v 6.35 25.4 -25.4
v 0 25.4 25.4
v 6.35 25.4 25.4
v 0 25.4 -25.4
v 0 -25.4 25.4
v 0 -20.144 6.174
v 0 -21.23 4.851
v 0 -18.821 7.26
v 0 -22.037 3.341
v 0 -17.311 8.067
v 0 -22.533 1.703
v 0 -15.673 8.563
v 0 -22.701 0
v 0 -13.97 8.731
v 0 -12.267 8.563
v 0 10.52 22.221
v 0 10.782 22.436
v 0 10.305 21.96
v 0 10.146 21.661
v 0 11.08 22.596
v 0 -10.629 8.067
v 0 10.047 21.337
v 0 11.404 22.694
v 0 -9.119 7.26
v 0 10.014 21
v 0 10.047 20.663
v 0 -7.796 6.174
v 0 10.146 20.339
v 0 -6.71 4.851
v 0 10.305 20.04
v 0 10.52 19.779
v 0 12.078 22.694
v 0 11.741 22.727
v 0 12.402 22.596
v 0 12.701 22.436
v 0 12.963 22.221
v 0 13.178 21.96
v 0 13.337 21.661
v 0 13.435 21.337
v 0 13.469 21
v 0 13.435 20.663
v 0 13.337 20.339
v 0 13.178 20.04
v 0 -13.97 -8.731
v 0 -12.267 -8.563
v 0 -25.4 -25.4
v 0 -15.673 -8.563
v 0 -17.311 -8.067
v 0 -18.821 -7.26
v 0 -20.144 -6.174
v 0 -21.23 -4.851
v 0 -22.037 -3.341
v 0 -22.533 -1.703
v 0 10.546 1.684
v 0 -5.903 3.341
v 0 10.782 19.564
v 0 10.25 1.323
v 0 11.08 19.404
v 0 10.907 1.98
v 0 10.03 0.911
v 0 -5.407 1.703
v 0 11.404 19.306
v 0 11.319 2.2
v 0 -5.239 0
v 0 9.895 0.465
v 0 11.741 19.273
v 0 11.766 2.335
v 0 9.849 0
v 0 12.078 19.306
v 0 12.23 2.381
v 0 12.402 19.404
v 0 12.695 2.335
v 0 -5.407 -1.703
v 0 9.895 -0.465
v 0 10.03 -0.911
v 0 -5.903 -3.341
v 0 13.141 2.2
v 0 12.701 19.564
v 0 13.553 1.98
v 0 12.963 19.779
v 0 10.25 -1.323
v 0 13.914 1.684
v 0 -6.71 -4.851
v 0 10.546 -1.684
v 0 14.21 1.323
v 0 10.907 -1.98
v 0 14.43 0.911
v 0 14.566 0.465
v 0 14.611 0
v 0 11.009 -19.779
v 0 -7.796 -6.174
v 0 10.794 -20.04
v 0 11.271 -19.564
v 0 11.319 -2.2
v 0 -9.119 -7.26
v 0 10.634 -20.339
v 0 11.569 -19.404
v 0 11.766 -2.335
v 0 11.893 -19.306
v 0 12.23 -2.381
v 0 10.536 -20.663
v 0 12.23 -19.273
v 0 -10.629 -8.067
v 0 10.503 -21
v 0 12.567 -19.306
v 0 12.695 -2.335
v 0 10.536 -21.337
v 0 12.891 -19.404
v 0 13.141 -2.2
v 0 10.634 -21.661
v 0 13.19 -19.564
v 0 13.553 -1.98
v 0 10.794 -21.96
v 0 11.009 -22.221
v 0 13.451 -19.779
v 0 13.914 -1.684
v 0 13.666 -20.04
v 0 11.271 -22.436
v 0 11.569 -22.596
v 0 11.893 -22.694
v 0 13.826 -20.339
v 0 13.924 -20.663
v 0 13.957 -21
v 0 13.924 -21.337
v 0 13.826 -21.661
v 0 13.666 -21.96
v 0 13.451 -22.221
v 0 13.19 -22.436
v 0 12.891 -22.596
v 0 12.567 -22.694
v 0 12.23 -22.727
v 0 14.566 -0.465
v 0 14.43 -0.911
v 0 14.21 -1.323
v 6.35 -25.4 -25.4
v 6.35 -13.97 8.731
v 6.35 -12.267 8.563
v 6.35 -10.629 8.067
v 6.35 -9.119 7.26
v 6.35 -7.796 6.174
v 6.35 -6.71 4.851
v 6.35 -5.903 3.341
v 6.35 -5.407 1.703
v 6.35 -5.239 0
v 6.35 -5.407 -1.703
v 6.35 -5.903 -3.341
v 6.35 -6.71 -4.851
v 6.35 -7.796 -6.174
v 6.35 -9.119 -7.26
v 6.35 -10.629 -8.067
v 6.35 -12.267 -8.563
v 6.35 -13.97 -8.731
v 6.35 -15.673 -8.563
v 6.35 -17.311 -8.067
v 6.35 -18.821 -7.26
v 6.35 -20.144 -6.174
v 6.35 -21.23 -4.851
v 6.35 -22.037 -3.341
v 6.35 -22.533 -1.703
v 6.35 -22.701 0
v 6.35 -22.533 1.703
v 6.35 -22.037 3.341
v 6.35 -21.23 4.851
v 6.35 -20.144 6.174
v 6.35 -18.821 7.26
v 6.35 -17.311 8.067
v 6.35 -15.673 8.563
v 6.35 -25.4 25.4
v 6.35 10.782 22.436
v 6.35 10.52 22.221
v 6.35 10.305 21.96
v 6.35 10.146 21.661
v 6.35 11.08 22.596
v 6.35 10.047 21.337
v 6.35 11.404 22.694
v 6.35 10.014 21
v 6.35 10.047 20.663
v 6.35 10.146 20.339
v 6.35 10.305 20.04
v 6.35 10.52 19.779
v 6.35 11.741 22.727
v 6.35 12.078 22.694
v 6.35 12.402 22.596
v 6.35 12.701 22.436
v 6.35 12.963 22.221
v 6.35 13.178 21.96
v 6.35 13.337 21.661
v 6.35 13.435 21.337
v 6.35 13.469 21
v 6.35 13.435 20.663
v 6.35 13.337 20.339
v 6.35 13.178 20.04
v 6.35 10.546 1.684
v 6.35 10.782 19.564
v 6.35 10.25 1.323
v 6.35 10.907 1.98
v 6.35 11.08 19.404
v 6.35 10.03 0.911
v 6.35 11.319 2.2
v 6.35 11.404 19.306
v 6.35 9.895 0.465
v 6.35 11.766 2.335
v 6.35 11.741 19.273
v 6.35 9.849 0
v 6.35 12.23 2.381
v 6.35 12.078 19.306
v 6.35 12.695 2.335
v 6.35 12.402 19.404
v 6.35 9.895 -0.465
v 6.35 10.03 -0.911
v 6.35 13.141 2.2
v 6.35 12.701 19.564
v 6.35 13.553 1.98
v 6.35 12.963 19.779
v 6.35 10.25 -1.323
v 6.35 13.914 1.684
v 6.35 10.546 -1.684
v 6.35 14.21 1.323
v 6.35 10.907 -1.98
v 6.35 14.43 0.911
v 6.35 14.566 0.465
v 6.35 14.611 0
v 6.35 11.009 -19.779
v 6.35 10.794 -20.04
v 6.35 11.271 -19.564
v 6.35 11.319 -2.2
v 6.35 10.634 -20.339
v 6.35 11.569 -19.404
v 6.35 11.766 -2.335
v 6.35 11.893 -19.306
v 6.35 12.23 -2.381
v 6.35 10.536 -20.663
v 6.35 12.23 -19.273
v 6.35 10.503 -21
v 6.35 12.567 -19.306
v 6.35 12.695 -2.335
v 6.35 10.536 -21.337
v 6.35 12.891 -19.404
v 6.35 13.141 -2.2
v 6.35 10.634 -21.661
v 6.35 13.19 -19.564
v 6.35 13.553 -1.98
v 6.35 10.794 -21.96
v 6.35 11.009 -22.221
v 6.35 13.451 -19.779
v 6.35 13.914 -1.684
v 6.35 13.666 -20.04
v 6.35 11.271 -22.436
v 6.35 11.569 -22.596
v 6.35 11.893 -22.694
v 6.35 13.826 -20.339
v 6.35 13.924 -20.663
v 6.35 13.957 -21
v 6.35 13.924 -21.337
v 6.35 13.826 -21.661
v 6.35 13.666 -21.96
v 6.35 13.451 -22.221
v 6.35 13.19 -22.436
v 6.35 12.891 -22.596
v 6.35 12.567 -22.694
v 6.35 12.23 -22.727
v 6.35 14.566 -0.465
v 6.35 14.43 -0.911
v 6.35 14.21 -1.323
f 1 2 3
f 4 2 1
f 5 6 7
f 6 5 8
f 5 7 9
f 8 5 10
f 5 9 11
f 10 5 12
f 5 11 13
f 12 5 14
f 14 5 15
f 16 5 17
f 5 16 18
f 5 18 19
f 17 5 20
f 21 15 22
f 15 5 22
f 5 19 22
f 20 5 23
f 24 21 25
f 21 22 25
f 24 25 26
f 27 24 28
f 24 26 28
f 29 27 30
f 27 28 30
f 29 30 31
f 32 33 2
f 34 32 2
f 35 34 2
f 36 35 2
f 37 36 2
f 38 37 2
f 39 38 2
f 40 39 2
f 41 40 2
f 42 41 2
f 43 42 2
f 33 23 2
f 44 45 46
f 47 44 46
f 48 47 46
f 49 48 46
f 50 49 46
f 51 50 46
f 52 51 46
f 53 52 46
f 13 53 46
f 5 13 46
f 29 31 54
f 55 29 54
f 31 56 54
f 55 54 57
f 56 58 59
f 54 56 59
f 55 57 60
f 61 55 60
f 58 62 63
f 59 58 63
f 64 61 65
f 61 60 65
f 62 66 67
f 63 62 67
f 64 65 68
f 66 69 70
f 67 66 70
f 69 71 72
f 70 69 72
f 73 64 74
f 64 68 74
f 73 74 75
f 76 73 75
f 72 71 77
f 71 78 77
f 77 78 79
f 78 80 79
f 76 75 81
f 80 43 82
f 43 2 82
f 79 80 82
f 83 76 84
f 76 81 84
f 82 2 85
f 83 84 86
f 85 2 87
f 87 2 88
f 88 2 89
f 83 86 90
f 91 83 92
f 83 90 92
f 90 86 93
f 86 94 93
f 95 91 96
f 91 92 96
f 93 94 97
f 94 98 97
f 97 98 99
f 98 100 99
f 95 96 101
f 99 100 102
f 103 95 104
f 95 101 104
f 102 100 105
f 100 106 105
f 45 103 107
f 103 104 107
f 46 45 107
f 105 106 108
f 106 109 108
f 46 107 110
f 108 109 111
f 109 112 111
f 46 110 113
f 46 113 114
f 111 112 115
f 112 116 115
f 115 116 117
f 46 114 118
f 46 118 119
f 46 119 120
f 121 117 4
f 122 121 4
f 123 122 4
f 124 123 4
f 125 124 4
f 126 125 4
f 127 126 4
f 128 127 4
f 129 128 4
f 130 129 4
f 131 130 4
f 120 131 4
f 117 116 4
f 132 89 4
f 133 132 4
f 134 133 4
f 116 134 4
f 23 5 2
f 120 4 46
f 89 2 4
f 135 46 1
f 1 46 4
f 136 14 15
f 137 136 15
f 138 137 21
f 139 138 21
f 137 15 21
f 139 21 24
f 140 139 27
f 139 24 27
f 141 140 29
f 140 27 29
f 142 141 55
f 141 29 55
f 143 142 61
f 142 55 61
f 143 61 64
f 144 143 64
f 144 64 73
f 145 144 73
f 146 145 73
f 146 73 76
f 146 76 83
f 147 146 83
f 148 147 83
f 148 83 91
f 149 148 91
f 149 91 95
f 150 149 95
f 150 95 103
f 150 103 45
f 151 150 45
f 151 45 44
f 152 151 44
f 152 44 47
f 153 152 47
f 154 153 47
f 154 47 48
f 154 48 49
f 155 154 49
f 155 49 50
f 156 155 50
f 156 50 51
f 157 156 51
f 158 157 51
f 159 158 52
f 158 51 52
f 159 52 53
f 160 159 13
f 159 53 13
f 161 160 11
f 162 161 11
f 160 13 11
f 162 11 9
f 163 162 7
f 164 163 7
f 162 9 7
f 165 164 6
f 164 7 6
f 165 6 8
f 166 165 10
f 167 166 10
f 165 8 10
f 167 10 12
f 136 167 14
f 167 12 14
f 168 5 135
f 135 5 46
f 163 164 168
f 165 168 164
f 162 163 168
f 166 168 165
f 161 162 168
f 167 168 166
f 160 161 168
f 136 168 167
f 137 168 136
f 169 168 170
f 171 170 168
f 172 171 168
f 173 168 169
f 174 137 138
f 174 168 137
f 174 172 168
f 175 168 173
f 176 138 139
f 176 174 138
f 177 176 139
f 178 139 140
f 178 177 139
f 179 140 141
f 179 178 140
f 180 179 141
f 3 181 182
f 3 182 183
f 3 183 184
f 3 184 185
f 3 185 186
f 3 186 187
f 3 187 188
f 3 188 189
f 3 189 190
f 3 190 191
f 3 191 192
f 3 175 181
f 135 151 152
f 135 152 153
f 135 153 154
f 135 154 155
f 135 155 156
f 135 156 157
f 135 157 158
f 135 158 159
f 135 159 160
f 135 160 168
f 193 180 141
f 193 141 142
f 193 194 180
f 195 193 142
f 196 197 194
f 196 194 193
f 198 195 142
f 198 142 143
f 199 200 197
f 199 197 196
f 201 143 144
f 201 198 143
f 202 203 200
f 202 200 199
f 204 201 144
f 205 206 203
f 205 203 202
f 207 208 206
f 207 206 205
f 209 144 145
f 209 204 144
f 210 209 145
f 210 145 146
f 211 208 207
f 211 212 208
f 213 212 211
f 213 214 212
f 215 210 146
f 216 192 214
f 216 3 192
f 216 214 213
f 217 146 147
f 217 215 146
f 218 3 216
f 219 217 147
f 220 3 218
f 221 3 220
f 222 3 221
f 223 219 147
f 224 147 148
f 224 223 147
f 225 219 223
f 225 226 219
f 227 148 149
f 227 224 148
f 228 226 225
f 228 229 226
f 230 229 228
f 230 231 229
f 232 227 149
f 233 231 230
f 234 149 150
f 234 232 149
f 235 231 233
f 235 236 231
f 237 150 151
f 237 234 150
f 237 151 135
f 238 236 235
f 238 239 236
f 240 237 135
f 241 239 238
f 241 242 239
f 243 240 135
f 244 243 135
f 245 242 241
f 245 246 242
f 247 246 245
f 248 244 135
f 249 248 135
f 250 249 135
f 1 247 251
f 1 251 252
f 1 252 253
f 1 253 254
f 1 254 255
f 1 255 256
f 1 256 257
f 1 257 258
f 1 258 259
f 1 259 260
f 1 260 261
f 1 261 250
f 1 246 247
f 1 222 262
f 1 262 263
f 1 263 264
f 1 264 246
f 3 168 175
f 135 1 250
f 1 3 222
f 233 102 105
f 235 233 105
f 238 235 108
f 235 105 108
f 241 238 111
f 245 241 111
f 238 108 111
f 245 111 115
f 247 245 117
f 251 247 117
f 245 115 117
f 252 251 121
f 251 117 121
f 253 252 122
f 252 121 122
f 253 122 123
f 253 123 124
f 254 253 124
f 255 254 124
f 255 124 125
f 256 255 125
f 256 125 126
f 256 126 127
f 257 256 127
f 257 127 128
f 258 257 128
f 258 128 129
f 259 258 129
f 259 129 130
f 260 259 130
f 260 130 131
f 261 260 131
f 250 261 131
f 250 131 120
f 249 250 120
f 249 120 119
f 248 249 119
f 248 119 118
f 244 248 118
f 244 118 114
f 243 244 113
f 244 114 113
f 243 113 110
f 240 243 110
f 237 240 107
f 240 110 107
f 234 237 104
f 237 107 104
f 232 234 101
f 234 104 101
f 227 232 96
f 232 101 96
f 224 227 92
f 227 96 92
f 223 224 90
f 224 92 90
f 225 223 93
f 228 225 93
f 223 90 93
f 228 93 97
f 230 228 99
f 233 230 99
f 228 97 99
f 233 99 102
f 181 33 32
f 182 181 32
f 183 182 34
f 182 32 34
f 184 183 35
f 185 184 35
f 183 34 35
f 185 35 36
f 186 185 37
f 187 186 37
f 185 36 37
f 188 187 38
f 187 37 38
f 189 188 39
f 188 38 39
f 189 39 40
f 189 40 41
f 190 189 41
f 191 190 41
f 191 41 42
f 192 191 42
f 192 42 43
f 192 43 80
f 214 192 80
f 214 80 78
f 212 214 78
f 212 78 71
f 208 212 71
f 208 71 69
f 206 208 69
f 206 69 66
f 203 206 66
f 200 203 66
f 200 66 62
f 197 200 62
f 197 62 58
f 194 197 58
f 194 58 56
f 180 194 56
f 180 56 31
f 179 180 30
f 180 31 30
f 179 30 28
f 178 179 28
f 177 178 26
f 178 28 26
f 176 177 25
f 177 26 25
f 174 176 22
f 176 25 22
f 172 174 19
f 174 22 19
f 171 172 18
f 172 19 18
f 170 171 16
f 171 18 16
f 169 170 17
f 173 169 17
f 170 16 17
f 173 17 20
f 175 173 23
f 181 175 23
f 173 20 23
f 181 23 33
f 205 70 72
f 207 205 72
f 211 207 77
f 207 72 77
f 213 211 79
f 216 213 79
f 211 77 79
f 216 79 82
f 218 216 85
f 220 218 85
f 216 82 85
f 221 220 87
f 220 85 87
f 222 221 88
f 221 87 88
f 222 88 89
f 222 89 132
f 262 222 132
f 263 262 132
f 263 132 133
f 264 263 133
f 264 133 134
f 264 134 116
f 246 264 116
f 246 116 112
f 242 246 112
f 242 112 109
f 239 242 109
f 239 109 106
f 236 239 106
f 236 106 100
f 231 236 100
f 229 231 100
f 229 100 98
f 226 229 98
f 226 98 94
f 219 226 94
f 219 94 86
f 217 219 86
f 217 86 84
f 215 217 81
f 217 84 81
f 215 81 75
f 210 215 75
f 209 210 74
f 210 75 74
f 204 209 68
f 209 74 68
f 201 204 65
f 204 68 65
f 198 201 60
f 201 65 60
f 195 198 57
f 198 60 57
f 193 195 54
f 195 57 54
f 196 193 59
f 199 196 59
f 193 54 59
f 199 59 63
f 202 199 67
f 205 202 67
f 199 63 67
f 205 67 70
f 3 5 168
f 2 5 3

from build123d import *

# Parameters (mm, degrees)
SKETCH1_W                           = 50.8
SKETCH1_H                           = 50.8
BOSS_EXTRUDE1_DEPTH                 = 6.35
F_11_16_0_6875_DIAMETER_HOLE1_D     = 17.4625
F_11_16_0_6875_DIAMETER_HOLE1_DEPTH = 70.104
F_11_16_0_6875_DIAMETER_HOLE1_TIP   = 5.24626428
F_3_16_0_1875_DIAMETER_HOLE1_D      = 4.7625
F_3_16_0_1875_DIAMETER_HOLE1_DEPTH  = 70.104
F_3_16_0_1875_DIAMETER_HOLE1_TIP    = 1.430799349
F_29_0_136_DIAMETER_HOLE1_D         = 3.4544
F_29_0_136_DIAMETER_HOLE1_DEPTH     = 70.104
F_29_0_136_DIAMETER_HOLE1_TIP       = 1.037806461


with BuildPart() as part:
    # Sketch1 → Boss-Extrude1 (new body)
    with BuildSketch(Plane(origin=(0, 0, 0), x_dir=(0, 0, -1), z_dir=(1, 0, 0))):
        Rectangle(SKETCH1_W, SKETCH1_H)
    extrude(amount=BOSS_EXTRUDE1_DEPTH)

    # 11/16 (0.6875) Diameter Hole1
    with Locations(Plane(origin=(6.35, 0, 0), x_dir=(0, 0, -1), z_dir=(1, 0, 0))):
        with Locations((0, -13.97)):
            Hole(F_11_16_0_6875_DIAMETER_HOLE1_D / 2, depth=F_11_16_0_6875_DIAMETER_HOLE1_DEPTH)
            with Locations((0, 0, -(F_11_16_0_6875_DIAMETER_HOLE1_DEPTH + F_11_16_0_6875_DIAMETER_HOLE1_TIP / 2))):  # 118° drill point
                Cone(0, F_11_16_0_6875_DIAMETER_HOLE1_D / 2, F_11_16_0_6875_DIAMETER_HOLE1_TIP, mode=Mode.SUBTRACT)

    # 3/16 (0.1875) Diameter Hole1
    with Locations(Plane(origin=(6.35, 0, 0), x_dir=(0, 0, -1), z_dir=(1, 0, 0))):
        with Locations((0, 12.2301)):
            Hole(F_3_16_0_1875_DIAMETER_HOLE1_D / 2, depth=F_3_16_0_1875_DIAMETER_HOLE1_DEPTH)
            with Locations((0, 0, -(F_3_16_0_1875_DIAMETER_HOLE1_DEPTH + F_3_16_0_1875_DIAMETER_HOLE1_TIP / 2))):  # 118° drill point
                Cone(0, F_3_16_0_1875_DIAMETER_HOLE1_D / 2, F_3_16_0_1875_DIAMETER_HOLE1_TIP, mode=Mode.SUBTRACT)

    # #29 (0.136) Diameter Hole1
    with Locations(Plane(origin=(6.35, 0, 0), x_dir=(0, 0, -1), z_dir=(1, 0, 0))):
        with Locations((21, 12.2301), (-21, 11.74145915)):
            Hole(F_29_0_136_DIAMETER_HOLE1_D / 2, depth=F_29_0_136_DIAMETER_HOLE1_DEPTH)
            with Locations((0, 0, -(F_29_0_136_DIAMETER_HOLE1_DEPTH + F_29_0_136_DIAMETER_HOLE1_TIP / 2))):  # 118° drill point
                Cone(0, F_29_0_136_DIAMETER_HOLE1_D / 2, F_29_0_136_DIAMETER_HOLE1_TIP, mode=Mode.SUBTRACT)


solid = part.part
